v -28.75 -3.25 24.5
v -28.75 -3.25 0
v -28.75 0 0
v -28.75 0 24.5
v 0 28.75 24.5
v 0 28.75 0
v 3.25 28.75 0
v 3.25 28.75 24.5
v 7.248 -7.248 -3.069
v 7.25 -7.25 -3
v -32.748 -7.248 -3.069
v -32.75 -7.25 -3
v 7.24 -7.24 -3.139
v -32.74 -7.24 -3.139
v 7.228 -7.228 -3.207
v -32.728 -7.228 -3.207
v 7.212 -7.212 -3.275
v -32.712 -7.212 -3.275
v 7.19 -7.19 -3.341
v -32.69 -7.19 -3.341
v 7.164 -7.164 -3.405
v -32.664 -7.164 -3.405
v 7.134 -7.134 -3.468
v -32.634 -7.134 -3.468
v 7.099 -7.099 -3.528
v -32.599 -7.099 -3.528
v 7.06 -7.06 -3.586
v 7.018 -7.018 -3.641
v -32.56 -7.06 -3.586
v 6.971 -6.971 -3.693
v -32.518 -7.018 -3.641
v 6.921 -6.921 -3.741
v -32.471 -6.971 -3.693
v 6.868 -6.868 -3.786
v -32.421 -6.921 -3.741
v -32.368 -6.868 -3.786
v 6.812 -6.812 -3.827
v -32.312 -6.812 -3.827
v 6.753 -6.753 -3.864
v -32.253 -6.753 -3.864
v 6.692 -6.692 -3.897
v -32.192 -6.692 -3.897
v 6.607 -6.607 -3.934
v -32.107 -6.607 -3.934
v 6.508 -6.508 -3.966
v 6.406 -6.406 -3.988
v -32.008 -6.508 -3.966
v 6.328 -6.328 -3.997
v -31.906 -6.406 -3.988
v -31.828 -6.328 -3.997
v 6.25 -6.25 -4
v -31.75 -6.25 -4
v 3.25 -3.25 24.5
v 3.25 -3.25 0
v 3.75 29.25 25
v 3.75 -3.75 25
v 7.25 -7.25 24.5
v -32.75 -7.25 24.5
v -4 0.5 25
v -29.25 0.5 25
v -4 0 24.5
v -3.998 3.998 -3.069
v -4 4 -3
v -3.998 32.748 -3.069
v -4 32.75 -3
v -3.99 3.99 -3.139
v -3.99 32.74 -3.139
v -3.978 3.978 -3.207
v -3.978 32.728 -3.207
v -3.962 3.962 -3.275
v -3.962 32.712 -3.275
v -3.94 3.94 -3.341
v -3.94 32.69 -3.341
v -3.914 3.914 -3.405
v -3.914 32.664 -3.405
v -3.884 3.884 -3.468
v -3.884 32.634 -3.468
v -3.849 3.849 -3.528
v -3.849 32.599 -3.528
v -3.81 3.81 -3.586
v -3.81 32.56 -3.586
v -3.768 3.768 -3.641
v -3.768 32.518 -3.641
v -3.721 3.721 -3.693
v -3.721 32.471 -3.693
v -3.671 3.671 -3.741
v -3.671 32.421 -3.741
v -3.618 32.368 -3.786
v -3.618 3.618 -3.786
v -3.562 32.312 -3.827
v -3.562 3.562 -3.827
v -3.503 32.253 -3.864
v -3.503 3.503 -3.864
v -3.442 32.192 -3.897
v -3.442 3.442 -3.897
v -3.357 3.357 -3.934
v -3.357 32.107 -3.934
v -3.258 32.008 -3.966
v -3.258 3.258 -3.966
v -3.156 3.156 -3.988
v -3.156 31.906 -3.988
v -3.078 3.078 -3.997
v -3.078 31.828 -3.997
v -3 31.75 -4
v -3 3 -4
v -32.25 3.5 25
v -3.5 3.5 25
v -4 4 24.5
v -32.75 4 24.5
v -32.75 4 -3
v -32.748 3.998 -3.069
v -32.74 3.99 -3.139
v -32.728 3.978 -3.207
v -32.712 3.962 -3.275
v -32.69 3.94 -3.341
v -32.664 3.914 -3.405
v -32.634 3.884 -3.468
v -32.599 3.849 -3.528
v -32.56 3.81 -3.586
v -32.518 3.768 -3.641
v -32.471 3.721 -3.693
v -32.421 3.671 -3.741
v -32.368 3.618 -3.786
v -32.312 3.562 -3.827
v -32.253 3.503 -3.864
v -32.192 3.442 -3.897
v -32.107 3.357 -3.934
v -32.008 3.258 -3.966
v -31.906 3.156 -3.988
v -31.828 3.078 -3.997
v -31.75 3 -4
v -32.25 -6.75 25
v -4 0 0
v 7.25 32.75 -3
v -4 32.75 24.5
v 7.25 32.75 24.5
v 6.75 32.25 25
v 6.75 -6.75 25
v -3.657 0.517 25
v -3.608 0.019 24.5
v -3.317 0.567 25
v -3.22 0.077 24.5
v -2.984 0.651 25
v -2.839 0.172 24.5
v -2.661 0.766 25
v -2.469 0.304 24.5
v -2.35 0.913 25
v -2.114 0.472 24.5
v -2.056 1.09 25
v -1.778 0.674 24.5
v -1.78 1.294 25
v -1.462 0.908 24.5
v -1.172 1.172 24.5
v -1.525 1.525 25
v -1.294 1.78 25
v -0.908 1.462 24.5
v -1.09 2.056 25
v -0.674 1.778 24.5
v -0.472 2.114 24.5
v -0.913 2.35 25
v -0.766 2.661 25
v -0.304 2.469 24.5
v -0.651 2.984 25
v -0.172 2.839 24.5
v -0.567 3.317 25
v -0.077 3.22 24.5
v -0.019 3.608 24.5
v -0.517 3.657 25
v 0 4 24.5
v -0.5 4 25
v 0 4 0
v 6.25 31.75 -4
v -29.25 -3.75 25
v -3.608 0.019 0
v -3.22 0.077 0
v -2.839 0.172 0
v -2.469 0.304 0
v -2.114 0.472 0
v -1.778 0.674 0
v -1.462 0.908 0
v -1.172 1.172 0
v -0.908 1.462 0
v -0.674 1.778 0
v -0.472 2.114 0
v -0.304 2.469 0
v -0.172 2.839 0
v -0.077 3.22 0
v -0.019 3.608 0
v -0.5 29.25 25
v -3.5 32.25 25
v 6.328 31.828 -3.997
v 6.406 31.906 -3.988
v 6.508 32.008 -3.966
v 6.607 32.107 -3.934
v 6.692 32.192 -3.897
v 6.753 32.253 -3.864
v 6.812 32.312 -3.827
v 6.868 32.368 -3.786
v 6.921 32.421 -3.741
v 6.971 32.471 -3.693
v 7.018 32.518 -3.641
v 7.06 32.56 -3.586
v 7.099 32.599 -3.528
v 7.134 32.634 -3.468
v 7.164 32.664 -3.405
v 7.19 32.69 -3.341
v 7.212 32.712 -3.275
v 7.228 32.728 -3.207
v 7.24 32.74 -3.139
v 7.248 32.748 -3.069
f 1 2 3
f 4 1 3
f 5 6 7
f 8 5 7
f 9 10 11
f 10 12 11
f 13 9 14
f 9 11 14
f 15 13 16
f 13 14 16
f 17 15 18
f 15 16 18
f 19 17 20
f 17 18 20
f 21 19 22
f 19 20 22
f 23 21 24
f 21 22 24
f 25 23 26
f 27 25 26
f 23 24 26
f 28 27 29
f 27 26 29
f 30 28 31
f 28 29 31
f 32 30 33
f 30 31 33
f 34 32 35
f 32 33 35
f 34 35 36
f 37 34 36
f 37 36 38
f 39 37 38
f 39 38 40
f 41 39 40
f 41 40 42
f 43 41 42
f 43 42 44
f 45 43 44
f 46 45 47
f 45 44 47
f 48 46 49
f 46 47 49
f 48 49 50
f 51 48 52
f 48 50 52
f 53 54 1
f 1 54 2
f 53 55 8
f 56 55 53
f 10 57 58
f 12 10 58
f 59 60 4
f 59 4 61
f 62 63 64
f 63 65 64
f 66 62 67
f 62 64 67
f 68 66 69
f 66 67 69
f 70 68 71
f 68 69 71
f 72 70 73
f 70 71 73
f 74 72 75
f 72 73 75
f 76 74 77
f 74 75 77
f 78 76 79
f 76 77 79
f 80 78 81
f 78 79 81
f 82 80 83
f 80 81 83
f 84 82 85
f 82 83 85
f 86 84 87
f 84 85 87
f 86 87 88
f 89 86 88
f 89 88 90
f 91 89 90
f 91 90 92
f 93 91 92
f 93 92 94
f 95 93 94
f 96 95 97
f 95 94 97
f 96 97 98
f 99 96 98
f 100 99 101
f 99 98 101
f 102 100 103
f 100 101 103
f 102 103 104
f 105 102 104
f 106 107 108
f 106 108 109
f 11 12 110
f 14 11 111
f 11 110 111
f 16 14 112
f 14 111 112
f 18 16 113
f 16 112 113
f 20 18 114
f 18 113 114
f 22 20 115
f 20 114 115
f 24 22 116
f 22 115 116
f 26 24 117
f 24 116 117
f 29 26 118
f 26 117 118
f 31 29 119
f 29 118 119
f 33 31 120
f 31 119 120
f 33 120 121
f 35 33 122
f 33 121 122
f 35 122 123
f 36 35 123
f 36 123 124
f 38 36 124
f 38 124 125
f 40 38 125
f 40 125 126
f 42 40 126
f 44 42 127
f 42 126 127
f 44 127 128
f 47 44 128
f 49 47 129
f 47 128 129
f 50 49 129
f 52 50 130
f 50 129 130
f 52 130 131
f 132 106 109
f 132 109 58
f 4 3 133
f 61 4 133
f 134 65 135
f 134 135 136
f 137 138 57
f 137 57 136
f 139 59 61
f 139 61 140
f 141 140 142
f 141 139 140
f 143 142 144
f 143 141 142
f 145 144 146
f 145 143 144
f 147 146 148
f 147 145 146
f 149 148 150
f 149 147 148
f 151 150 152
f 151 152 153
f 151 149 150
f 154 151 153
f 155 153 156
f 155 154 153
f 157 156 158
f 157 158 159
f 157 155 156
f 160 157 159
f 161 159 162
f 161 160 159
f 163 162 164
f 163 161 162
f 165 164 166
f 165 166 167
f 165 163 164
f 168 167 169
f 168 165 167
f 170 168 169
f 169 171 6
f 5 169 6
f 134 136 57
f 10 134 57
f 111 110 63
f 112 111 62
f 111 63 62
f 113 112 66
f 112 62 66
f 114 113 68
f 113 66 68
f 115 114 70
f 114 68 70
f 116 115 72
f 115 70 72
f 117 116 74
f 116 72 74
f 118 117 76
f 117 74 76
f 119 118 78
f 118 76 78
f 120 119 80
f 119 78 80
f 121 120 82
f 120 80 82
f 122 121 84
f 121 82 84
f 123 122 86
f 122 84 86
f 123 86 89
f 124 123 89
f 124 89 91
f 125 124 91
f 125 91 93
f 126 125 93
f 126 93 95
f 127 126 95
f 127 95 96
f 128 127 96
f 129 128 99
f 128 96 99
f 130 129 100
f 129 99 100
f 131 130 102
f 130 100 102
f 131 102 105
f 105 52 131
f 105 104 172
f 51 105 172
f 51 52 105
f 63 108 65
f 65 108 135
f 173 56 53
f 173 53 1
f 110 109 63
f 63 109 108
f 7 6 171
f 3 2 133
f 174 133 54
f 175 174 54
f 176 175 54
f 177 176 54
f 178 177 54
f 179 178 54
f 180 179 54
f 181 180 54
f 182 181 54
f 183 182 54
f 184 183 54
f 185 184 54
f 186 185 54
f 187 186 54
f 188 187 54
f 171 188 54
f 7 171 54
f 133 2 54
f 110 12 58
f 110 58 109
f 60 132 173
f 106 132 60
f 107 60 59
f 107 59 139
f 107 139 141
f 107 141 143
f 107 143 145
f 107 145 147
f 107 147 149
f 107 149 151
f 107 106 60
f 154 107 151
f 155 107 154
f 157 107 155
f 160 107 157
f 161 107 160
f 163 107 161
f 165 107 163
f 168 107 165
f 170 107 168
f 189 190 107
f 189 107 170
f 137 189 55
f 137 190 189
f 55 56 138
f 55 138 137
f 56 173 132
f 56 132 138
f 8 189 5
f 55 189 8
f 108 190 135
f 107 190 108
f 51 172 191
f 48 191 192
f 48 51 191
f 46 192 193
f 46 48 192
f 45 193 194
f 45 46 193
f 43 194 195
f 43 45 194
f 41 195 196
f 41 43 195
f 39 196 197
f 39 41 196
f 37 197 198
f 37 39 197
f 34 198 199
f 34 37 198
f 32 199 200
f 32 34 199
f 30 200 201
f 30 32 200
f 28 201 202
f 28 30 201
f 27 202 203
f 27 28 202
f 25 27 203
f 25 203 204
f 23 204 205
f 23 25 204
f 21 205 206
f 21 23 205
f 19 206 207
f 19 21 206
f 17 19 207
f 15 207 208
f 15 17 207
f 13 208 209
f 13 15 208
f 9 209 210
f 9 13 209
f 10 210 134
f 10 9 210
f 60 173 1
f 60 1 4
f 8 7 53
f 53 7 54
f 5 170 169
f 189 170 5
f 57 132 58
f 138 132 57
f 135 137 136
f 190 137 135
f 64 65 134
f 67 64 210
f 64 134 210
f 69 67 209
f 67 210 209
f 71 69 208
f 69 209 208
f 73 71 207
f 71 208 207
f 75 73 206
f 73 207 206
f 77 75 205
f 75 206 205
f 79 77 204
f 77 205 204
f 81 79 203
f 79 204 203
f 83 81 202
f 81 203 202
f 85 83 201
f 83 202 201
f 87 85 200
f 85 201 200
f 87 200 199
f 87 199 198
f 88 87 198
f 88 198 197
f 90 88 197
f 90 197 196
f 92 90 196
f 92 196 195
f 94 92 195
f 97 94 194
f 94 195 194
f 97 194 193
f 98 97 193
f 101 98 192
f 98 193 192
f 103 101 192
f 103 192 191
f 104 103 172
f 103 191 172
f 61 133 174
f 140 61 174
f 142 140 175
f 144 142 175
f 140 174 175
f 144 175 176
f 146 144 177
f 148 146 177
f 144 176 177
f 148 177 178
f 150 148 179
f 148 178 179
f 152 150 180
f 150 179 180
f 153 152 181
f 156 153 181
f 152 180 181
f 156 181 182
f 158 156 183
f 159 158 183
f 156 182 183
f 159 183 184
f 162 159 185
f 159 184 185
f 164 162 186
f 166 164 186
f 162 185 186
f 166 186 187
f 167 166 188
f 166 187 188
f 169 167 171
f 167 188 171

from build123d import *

# Parameters (mm, degrees)
F1_DEPTH = 25
F2_SIZE  = 0.5
F4_DEPTH = 4
F5_R     = 1


with BuildPart() as f1:
    # F0 (on Top) → F1 (new body)
    with BuildSketch(Plane.XY):
        Polygon((-32.75, 4), (-32.75, -7.25), (7.25, -7.25), (7.25, 32.75), (-4, 32.75), (-4, 4), align=None)
        with BuildLine():
            Line((0, 4), (0, 28.75))
            Line((0, 28.75), (3.25, 28.75))
            Line((3.25, 28.75), (3.25, -3.25))
            Line((3.25, -3.25), (-28.75, -3.25))
            Line((-28.75, -3.25), (-28.75, 0))
            Line((-28.75, 0), (-4, 0))
            ThreePointArc((-4, 0), (-1.171573, 1.171573), (0, 4))
        make_face(mode=Mode.SUBTRACT)
    extrude(amount=F1_DEPTH)

    # F2
    f2_edges = [f1.edges().sort_by_distance(p)[0] for p in [
        (-32.75, -1.625, 25),
        (-12.75, -7.25, 25),
        (7.25, 12.75, 25),
        (1.625, 32.75, 25),
        (-4, 18.375, 25),
        (-18.375, 4, 25),
        (0, 16.375, 25),
        (1.625, 28.75, 25),
        (3.25, 12.75, 25),
        (-12.75, -3.25, 25),
        (-28.75, -1.625, 25),
        (-16.375, 0, 25),
        (-1.171573, 1.171573, 25),
    ]]
    chamfer(f2_edges, length=F2_SIZE)

    # F3 (on face) → F4 (join)
    with BuildSketch(Plane(origin=(0, 0, 0), x_dir=(1, 0, 0), z_dir=(0, 0, -1))):
        Polygon((7.25, 7.25), (-32.75, 7.25), (-32.75, -4), (-4, -4), (-4, -32.75), (7.25, -32.75), align=None)
    extrude(amount=F4_DEPTH)

    # F5
    f5_edges = [f1.edges().sort_by_distance(p)[0] for p in [
        (-12.75, -7.25, -4),
        (-32.75, -1.625, -4),
        (-18.375, 4, -4),
        (-4, 18.375, -4),
        (1.625, 32.75, -4),
        (7.25, 12.75, -4),
    ]]
    fillet(f5_edges, radius=F5_R)


solid = f1.part
